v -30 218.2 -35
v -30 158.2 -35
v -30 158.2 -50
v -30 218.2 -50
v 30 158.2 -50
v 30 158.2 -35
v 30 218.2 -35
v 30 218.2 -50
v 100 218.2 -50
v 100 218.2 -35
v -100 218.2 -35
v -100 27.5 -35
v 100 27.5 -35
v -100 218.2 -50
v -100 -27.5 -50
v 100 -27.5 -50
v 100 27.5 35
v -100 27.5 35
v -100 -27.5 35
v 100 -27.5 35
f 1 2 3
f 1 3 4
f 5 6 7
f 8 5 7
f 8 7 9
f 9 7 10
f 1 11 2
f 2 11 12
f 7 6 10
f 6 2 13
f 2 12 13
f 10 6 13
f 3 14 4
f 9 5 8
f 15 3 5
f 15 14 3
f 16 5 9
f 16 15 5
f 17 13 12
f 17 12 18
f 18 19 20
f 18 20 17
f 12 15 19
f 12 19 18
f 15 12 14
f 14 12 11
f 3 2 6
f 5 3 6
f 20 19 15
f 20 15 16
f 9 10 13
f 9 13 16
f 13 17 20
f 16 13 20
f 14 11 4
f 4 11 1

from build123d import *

# Parameters (mm, degrees)
F0_W     = 55
F0_H     = 70
F1_DEPTH = 100
F2_W     = 200
F2_H     = 190.7
F2_H_2   = 55
F3_DEPTH = 15
F4_W     = 60
F4_H     = 60
F5_DEPTH = 25


with BuildPart() as f1:
    # F0 (on Right) → F1 (new body, symmetric)
    with BuildSketch(Plane.YZ):
        Rectangle(F0_W, F0_H)
    extrude(amount=F1_DEPTH, both=True)

    # F2 (on face) → F3 (join)
    with BuildSketch(Plane(origin=(0, 0, -35), x_dir=(1, 0, 0), z_dir=(0, 0, -1))):
        with Locations((0, -122.85)):
            Rectangle(F2_W, F2_H)
        Rectangle(F2_W, F2_H_2)
    extrude(amount=F3_DEPTH)

    # F4 (on face) → F5 (cut)
    with BuildSketch(Plane.XY.offset(-35)):
        with Locations((0, 188.2)):
            Rectangle(F4_W, F4_H)
    extrude(amount=-F5_DEPTH, mode=Mode.SUBTRACT)


solid = f1.part
